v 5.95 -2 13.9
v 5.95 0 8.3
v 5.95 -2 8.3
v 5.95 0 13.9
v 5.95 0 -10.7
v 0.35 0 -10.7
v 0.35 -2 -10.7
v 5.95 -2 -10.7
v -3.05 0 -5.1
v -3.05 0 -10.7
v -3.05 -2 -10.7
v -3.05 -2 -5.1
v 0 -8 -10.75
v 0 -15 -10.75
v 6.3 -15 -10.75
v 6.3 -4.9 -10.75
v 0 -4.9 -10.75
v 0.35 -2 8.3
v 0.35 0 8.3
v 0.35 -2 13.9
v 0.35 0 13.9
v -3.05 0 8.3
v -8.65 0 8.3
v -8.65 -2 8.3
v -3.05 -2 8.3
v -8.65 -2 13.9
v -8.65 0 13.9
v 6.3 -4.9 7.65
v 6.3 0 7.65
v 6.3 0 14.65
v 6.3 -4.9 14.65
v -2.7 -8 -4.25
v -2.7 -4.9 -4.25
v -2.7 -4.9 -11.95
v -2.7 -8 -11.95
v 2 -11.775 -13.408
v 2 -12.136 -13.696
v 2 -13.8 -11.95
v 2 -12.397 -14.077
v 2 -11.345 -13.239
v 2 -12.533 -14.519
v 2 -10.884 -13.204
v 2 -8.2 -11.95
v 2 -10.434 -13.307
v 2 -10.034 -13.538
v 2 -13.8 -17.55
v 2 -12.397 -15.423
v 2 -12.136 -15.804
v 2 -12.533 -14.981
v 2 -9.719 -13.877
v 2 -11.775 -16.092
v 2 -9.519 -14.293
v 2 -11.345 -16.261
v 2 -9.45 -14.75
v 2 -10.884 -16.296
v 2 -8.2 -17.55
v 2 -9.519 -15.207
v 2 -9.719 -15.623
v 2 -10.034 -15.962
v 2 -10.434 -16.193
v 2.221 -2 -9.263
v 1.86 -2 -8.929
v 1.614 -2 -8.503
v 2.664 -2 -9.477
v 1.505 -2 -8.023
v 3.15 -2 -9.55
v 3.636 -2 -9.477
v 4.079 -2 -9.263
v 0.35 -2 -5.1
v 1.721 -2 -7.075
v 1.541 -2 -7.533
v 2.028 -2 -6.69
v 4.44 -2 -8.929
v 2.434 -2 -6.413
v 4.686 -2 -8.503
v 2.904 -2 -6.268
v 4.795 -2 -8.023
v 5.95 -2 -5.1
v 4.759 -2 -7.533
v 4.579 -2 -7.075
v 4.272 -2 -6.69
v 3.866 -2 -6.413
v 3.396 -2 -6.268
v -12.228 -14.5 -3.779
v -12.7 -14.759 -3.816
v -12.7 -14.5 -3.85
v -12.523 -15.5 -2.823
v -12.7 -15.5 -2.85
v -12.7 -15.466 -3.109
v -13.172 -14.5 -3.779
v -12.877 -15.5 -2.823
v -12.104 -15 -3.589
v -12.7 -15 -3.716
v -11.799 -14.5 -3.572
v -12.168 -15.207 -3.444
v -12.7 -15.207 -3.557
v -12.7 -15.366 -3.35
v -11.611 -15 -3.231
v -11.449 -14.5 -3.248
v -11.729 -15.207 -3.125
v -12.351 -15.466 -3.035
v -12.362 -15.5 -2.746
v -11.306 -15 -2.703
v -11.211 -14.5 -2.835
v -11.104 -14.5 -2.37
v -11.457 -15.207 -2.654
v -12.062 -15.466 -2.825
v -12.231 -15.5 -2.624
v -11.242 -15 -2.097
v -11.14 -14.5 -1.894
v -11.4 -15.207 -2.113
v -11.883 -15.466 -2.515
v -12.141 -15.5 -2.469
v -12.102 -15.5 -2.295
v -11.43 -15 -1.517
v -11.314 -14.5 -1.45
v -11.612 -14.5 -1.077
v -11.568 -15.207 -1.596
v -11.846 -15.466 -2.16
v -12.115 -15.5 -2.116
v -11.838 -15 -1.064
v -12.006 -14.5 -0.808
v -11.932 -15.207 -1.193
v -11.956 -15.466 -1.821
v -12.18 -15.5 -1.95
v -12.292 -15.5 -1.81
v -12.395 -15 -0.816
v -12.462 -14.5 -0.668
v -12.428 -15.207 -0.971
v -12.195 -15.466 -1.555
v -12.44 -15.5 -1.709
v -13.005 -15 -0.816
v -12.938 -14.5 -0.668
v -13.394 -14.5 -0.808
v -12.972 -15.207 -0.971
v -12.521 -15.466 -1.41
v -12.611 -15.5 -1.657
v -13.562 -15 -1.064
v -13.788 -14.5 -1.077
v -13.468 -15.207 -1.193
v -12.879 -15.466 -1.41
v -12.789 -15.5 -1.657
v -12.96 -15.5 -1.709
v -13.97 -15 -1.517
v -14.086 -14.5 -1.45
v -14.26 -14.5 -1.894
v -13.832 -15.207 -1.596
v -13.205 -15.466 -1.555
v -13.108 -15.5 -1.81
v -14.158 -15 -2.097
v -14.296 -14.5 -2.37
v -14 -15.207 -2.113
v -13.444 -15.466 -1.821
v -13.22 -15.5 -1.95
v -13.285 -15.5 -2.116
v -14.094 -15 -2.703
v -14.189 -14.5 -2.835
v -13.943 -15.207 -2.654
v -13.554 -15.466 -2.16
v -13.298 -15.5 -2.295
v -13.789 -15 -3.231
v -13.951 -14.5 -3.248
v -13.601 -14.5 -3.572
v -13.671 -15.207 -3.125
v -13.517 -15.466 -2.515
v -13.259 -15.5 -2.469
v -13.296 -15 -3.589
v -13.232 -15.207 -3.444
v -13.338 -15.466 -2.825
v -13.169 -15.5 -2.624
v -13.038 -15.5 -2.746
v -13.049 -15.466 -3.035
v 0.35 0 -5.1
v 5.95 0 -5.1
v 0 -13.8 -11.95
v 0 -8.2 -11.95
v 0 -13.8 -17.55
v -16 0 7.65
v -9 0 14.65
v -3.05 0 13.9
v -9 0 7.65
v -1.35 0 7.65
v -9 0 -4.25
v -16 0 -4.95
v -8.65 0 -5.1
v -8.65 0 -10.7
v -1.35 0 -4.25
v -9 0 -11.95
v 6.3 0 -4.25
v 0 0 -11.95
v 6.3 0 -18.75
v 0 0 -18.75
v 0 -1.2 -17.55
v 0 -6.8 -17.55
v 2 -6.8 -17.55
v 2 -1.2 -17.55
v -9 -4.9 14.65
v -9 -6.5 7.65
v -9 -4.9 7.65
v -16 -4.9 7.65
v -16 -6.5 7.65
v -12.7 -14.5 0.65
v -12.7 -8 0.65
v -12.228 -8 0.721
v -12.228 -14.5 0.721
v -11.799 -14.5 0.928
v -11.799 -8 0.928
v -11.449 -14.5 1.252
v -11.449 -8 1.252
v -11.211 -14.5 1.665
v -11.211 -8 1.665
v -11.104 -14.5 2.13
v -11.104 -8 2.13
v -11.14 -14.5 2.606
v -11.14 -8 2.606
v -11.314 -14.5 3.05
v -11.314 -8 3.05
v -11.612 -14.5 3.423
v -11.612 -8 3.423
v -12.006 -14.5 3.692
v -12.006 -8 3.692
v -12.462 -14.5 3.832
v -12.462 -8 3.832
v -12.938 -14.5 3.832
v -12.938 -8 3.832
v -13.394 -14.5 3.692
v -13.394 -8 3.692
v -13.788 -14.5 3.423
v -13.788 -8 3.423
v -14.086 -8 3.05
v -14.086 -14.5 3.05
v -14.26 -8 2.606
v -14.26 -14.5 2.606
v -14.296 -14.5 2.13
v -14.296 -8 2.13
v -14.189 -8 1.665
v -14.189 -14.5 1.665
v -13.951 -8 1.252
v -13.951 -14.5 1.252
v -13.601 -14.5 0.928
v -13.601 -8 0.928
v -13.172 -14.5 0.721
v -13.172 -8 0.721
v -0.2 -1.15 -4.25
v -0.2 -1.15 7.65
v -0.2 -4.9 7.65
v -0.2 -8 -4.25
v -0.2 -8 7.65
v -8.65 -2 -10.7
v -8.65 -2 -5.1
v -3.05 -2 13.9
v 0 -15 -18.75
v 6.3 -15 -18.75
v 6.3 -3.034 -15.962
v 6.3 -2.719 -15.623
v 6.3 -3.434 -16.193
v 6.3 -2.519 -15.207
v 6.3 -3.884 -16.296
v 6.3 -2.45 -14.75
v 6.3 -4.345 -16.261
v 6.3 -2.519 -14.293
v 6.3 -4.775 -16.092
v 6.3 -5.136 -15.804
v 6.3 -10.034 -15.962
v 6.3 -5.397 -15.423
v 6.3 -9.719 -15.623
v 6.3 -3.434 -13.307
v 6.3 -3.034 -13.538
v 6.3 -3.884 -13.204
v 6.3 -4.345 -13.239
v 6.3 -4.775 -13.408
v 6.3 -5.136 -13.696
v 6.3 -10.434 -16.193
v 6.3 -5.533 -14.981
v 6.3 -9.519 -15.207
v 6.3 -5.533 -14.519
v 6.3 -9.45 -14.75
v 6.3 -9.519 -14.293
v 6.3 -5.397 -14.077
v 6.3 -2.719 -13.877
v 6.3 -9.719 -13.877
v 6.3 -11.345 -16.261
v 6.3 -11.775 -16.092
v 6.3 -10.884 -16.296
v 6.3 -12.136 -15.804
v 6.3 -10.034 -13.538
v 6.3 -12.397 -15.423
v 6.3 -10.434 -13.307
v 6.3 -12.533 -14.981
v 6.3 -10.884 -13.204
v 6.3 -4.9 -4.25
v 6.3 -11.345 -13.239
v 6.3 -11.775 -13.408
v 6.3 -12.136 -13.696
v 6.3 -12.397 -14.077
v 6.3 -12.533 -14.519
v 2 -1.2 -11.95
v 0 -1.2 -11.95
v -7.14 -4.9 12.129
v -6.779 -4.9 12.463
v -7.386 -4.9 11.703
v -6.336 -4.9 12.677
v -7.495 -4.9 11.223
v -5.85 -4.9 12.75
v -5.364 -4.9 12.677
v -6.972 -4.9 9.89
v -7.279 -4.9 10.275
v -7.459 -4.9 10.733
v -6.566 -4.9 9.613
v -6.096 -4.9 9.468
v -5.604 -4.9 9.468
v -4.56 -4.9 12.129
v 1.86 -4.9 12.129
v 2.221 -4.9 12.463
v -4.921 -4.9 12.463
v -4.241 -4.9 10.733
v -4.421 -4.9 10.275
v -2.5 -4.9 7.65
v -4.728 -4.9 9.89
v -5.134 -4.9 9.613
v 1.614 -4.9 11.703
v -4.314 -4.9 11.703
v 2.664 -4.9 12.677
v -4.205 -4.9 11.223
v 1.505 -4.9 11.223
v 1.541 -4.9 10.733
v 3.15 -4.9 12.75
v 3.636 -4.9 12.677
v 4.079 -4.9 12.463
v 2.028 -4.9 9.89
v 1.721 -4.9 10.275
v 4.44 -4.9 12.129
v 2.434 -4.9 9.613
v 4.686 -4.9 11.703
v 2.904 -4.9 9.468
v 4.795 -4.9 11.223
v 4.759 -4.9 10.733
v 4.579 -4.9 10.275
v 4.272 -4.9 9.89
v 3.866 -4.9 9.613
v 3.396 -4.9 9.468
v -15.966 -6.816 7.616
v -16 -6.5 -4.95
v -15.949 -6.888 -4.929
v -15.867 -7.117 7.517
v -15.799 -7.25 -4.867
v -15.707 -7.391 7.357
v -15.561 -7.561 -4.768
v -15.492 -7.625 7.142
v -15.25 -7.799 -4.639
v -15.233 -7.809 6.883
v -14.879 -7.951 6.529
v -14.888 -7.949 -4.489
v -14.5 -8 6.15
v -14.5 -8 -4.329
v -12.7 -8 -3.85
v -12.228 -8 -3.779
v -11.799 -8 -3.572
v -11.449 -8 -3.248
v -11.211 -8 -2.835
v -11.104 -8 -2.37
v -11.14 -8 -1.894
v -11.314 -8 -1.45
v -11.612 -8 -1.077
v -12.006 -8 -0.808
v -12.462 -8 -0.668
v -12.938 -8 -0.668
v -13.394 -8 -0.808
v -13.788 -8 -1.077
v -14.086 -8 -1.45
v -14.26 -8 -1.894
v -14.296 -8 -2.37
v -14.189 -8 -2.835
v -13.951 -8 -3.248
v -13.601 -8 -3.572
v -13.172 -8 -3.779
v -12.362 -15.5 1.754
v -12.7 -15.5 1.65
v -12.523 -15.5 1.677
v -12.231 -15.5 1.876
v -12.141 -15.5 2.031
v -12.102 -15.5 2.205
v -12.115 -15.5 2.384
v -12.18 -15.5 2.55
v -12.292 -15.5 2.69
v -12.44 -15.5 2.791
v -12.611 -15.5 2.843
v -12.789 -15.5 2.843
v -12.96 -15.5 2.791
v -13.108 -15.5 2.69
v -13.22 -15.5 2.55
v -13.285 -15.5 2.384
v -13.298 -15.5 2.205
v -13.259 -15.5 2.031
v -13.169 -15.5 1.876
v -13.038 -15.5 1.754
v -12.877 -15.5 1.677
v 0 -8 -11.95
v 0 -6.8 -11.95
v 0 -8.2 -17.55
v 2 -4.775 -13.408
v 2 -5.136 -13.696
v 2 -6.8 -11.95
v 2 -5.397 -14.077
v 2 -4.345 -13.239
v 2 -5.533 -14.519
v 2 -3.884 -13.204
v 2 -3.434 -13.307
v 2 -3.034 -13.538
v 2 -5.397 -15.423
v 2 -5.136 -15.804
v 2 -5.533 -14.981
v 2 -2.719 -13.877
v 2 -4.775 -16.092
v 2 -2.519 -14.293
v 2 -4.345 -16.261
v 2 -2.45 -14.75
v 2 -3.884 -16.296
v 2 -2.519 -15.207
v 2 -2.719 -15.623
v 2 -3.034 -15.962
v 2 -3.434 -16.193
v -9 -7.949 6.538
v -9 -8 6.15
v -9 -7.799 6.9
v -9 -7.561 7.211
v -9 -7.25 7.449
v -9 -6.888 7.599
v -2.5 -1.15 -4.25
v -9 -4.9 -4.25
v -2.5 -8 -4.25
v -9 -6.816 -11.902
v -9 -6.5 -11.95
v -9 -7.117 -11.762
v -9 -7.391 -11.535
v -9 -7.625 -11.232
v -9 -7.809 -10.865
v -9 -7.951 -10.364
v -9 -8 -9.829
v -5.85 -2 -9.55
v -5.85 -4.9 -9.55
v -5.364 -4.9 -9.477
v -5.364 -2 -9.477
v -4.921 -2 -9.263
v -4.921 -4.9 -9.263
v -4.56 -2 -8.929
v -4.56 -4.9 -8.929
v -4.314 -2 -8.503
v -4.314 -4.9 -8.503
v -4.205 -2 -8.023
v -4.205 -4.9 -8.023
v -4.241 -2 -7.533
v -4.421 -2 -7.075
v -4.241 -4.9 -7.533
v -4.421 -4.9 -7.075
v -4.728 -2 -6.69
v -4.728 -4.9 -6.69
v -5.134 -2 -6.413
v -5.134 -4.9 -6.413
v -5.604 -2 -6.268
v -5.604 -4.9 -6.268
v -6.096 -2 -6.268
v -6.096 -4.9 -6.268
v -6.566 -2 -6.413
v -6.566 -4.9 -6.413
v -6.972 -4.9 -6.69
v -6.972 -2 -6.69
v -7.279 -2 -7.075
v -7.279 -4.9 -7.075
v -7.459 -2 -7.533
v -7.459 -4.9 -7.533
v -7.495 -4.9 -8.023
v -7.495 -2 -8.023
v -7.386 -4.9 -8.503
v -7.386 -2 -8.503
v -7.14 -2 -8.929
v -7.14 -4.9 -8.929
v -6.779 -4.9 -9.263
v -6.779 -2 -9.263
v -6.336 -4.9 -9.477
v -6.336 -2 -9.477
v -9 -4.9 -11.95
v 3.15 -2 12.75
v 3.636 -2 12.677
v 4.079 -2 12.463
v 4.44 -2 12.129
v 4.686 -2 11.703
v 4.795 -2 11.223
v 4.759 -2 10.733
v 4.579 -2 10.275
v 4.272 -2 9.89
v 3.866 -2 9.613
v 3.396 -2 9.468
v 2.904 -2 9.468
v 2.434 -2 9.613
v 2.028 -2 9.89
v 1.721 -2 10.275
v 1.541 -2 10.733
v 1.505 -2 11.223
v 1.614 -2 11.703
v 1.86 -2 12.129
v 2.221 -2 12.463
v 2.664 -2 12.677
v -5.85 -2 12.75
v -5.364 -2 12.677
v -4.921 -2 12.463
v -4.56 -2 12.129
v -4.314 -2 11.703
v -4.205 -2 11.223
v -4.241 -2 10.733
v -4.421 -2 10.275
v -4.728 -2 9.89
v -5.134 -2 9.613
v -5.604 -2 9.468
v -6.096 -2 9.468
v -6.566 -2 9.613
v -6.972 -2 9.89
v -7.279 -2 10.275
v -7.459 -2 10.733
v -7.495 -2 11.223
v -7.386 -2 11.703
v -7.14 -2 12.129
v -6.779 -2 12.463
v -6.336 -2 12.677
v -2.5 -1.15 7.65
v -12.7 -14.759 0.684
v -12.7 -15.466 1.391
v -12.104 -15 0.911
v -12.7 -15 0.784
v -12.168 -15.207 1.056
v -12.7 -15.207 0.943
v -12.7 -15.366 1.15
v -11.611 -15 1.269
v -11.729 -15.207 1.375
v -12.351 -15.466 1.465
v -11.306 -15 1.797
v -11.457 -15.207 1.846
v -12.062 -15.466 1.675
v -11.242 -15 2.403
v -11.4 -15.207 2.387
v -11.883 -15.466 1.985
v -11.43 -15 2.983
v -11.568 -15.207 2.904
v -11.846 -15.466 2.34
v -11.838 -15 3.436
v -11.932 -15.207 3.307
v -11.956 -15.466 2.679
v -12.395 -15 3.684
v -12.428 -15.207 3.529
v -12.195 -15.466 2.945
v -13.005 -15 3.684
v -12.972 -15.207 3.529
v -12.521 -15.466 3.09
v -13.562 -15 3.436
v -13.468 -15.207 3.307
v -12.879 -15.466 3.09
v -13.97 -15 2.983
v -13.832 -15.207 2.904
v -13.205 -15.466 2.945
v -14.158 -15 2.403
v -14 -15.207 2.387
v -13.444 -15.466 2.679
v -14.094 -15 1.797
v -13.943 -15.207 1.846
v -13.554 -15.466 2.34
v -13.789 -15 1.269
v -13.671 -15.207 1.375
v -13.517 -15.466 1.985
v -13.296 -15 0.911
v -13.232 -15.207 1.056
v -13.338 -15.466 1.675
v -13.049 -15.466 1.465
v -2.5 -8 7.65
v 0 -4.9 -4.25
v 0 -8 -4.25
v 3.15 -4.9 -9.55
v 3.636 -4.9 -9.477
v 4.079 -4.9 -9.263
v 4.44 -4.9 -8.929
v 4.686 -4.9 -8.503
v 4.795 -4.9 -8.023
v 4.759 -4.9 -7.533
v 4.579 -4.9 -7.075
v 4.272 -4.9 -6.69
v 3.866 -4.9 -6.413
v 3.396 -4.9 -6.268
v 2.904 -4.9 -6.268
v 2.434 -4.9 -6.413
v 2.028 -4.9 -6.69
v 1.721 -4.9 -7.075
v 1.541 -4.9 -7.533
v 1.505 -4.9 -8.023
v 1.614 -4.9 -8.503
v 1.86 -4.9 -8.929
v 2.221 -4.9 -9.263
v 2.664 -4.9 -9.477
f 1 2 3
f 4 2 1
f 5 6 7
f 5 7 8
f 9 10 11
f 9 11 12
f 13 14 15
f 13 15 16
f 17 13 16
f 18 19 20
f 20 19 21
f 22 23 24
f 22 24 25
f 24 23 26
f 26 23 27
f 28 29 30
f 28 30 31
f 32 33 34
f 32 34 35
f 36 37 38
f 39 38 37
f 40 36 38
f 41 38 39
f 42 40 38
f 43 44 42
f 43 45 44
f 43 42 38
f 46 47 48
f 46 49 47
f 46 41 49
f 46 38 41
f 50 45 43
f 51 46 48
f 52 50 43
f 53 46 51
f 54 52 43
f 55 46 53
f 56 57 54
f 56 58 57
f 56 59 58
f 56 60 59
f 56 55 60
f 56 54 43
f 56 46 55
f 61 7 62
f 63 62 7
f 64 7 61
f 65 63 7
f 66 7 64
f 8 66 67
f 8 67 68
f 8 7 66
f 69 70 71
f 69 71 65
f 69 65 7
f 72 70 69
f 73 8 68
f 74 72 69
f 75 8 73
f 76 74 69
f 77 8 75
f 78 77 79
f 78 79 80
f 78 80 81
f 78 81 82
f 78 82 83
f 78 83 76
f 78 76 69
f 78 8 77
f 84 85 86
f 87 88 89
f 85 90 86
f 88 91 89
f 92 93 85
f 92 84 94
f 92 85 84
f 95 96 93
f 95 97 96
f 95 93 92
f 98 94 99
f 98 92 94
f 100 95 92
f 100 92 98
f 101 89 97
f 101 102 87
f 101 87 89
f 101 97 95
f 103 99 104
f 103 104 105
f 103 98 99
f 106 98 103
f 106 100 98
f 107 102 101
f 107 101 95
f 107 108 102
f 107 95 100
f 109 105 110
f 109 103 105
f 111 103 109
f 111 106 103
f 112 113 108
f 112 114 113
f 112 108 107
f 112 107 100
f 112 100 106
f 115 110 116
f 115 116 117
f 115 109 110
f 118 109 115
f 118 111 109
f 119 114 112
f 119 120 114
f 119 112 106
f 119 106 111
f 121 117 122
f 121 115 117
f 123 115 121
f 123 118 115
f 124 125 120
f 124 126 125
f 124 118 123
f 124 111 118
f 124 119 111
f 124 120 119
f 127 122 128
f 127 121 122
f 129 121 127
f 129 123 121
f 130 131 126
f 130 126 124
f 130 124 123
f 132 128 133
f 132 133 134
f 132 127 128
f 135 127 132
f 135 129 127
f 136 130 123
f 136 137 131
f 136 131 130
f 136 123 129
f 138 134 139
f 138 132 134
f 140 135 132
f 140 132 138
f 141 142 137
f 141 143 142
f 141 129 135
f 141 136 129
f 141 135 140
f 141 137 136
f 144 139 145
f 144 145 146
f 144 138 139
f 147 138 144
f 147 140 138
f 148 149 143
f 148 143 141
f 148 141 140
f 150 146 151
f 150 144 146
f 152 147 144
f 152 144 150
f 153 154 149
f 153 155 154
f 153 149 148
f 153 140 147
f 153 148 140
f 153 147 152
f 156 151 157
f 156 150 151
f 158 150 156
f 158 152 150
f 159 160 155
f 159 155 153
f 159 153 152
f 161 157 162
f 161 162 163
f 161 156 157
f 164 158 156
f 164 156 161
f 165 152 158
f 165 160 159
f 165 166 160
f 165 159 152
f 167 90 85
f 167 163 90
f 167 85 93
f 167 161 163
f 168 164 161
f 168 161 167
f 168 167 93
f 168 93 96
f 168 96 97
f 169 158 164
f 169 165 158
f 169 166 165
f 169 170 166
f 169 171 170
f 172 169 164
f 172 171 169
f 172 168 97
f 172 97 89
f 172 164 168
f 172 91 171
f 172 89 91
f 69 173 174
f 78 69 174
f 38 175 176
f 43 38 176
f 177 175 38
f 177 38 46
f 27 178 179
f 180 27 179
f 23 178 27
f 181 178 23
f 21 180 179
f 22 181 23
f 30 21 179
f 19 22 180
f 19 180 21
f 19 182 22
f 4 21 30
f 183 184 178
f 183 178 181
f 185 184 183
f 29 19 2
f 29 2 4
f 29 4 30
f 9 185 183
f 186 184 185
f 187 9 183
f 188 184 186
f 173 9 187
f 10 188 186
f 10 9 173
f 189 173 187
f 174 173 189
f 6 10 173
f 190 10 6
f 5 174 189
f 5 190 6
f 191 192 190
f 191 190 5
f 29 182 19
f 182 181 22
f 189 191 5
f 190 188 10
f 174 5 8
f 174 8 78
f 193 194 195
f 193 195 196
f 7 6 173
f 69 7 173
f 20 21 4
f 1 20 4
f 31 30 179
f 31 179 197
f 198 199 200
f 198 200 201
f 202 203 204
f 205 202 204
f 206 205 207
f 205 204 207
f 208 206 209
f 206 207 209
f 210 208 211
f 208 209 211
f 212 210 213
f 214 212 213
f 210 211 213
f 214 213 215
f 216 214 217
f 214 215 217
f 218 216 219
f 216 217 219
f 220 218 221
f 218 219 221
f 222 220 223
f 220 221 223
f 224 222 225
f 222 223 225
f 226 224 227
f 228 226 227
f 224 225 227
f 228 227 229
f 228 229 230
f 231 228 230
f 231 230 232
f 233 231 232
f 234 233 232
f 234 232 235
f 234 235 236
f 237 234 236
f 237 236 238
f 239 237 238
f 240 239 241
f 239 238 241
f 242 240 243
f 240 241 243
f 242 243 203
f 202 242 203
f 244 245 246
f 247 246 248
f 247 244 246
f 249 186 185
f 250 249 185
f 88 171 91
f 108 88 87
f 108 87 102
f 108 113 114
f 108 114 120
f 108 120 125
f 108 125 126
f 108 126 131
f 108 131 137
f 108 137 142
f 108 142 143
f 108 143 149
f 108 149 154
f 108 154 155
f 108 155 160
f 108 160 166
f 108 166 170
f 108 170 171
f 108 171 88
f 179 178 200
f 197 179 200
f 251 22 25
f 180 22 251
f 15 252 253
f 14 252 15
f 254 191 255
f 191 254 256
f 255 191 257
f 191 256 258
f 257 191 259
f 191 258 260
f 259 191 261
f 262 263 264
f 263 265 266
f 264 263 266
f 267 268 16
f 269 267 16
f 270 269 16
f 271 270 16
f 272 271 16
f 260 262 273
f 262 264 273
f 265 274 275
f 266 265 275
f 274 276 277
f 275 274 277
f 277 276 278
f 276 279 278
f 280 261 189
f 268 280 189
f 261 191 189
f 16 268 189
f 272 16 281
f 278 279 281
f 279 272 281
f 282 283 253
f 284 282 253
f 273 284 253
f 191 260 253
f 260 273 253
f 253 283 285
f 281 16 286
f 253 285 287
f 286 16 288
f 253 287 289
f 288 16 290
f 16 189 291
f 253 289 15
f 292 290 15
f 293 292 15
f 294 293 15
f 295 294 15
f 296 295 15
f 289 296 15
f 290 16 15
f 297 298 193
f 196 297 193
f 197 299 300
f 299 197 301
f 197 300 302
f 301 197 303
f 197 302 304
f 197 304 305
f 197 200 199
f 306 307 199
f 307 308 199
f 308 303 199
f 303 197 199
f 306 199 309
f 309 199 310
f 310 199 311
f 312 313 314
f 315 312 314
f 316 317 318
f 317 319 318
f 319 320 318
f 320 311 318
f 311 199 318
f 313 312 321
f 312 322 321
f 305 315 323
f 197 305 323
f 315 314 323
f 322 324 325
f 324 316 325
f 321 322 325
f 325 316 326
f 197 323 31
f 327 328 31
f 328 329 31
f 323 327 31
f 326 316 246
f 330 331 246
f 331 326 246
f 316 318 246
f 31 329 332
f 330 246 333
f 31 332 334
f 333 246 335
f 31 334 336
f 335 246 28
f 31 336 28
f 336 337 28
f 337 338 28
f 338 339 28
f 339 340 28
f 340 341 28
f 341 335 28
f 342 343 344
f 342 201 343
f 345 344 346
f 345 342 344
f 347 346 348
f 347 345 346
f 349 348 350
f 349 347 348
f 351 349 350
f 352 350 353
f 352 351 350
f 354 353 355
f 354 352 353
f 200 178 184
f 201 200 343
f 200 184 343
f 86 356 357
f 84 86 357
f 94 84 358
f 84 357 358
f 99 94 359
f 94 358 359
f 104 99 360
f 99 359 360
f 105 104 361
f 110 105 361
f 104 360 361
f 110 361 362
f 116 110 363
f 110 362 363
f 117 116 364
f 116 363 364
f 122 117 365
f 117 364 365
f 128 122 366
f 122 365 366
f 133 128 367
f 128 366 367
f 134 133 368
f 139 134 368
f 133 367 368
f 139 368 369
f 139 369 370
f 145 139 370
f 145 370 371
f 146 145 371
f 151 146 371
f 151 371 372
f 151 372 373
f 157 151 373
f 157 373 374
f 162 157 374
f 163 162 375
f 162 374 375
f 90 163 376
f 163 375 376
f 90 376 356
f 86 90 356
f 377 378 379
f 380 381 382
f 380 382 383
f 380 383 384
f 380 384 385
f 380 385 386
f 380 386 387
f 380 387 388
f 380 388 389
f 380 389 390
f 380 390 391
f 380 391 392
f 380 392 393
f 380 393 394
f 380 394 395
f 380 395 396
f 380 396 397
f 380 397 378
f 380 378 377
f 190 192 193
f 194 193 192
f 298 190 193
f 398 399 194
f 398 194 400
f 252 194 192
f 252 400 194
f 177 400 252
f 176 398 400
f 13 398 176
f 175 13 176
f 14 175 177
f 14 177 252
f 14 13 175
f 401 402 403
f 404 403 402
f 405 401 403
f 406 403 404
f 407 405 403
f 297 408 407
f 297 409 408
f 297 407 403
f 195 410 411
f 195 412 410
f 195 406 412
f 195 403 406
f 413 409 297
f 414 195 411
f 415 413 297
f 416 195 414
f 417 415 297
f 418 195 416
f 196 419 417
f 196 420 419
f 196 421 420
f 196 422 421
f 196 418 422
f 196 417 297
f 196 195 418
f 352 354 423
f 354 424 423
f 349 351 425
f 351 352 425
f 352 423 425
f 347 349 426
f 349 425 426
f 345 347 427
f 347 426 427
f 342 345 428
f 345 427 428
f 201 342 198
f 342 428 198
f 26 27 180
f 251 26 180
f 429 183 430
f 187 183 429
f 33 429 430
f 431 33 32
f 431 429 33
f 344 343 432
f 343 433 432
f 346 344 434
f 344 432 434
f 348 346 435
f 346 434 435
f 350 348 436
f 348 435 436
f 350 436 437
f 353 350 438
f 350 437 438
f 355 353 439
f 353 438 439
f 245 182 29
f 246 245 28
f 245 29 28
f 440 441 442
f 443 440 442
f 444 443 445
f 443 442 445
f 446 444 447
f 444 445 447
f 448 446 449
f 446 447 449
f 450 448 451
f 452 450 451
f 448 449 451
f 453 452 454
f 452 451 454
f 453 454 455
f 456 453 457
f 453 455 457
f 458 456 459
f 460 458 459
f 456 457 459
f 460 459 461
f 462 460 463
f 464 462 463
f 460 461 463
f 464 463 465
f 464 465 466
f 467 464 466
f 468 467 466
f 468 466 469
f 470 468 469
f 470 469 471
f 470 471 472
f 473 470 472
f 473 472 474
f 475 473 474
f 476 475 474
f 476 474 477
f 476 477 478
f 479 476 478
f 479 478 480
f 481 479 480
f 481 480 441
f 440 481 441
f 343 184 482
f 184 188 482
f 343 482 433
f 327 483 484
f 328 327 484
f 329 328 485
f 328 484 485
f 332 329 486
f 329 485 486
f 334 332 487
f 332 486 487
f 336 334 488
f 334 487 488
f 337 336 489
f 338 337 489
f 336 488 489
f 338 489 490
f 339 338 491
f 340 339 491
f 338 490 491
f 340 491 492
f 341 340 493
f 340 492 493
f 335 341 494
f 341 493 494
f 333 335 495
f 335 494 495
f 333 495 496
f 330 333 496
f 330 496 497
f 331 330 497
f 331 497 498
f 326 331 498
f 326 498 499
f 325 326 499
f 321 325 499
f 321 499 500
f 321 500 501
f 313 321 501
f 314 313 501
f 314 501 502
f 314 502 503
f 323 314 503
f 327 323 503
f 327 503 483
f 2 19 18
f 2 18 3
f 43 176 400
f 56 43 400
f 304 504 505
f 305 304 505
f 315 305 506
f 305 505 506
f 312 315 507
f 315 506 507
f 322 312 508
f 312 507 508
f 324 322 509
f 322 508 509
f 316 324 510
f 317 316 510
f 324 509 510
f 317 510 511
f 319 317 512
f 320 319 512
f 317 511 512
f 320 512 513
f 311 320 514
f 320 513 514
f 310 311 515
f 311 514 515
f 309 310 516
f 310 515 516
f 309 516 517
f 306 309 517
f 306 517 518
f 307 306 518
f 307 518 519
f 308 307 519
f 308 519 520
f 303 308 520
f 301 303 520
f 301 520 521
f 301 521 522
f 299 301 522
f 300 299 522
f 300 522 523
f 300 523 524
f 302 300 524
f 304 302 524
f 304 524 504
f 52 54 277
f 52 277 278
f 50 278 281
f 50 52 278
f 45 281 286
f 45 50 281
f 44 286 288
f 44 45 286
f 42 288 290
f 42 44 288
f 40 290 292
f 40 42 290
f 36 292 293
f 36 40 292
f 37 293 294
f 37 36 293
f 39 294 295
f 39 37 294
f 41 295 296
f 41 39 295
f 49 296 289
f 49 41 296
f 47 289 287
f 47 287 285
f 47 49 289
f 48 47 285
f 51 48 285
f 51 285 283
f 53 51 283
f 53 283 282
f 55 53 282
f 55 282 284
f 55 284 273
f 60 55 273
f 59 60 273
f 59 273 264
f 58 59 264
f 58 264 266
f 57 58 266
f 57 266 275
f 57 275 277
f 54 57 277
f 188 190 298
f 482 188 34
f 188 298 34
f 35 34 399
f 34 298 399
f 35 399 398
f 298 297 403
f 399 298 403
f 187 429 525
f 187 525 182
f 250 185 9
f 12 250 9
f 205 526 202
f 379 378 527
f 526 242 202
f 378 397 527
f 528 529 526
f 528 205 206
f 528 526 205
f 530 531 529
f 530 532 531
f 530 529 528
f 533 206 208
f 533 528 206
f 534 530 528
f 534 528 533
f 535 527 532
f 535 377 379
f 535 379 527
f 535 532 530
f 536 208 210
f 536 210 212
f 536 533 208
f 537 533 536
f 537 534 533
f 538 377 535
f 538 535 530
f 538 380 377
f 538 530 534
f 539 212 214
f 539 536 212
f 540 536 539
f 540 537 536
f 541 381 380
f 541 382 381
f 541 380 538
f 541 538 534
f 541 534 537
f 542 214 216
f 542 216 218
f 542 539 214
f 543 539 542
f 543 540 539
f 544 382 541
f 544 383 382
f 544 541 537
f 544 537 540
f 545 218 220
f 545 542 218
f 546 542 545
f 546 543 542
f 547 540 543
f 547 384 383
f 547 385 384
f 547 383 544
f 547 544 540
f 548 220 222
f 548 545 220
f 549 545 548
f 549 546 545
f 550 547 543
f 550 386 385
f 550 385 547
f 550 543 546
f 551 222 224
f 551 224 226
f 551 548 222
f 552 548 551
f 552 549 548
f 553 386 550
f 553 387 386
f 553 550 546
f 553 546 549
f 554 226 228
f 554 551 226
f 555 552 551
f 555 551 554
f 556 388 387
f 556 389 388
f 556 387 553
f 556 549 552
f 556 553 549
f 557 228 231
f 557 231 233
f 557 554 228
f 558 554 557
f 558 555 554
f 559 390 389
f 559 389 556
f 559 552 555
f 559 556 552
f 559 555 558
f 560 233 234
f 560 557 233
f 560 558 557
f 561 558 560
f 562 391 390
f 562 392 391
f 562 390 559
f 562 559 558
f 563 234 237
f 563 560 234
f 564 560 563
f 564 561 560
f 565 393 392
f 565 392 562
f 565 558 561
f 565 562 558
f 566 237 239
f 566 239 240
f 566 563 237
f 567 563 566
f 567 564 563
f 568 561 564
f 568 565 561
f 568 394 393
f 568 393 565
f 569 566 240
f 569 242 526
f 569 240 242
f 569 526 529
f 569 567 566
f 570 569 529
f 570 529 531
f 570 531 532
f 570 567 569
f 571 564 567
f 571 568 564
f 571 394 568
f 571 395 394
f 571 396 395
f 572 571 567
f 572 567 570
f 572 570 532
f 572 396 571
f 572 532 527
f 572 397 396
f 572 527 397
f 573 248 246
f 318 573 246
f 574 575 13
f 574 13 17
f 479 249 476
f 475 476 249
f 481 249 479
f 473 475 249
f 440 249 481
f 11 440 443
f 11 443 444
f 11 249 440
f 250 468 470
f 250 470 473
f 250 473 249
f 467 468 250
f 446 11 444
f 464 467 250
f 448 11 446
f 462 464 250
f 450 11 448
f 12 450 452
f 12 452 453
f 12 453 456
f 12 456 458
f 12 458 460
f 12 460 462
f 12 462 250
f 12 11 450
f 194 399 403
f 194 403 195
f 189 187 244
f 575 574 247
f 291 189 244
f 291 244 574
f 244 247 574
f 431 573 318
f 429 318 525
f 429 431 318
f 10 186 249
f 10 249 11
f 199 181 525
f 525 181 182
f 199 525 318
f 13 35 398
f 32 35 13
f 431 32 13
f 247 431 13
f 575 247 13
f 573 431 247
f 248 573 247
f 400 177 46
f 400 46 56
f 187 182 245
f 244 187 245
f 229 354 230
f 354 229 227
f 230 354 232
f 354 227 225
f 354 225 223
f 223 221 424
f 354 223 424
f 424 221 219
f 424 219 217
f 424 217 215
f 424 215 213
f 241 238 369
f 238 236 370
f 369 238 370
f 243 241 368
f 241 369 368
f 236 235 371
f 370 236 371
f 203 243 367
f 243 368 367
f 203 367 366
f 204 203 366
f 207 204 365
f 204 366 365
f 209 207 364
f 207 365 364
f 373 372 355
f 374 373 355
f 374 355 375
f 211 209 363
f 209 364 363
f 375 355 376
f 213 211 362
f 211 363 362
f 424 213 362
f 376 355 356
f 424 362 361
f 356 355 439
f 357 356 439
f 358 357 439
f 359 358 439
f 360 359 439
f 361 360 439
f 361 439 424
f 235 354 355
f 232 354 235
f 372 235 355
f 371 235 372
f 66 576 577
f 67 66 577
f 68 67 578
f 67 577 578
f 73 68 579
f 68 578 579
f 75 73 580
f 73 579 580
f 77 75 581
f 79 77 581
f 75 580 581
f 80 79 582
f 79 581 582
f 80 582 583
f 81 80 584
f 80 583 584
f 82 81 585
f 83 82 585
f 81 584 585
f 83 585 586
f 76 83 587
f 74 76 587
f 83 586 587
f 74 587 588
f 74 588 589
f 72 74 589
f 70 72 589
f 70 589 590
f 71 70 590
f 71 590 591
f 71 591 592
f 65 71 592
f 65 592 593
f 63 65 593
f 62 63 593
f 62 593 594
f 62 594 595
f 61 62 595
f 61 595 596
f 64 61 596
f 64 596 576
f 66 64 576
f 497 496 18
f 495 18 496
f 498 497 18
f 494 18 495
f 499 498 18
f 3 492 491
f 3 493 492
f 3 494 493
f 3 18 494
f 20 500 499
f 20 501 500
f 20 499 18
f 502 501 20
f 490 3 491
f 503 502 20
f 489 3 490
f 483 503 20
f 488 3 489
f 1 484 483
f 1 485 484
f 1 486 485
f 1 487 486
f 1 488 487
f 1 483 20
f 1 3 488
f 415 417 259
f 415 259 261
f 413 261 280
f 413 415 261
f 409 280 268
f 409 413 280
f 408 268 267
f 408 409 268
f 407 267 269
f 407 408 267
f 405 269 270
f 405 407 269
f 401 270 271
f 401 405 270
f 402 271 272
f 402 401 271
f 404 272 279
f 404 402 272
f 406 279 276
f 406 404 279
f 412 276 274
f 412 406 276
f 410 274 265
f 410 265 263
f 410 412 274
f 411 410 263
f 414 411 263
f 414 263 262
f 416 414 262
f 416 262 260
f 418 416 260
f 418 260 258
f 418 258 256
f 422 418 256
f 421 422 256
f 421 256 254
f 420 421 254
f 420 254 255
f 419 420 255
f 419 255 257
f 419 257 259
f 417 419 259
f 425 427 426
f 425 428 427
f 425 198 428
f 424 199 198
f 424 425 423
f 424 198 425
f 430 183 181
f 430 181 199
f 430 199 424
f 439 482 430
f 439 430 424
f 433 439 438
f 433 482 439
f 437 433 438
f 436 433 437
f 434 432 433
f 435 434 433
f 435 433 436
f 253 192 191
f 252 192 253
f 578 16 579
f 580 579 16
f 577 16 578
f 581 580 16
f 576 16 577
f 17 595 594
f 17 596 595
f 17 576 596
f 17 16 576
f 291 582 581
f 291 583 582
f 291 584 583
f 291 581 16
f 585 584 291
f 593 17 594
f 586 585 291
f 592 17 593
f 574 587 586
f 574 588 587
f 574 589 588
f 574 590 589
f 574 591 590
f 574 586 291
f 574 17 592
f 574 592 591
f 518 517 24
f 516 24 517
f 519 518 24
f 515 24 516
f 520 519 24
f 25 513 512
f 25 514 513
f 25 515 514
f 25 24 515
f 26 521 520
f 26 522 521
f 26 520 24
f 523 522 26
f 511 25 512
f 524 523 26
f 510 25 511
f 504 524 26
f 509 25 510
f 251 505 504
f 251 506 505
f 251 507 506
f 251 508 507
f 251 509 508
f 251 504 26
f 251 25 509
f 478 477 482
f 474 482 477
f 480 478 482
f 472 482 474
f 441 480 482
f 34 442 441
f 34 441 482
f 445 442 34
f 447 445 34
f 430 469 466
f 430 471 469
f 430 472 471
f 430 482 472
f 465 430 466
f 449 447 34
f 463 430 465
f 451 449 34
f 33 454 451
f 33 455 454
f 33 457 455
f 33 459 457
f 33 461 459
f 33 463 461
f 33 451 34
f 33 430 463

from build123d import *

# Parameters (mm, degrees)
SKETCH_R        = 1.55
PAD_DEPTH       = 6.3
SKETCH002_W     = 5.6
SKETCH002_H     = 5.6
POCKET_DEPTH    = 2
PAD001_DEPTH    = 7.7
SKETCH003_R     = 1.65
POCKET001_DEPTH = 4.901
SKETCH004_W     = 5.6
SKETCH004_H     = 5.6
POCKET002_DEPTH = 2
SKETCH005_W     = 8
SKETCH005_H     = 7
PAD002_DEPTH    = 11.9
SKETCH006_R     = 1.6
PAD003_DEPTH    = 7.5
PAD004_DEPTH    = 11.9
SKETCH008_W     = 4.9
SKETCH008_H     = 22.3
PAD005_DEPTH    = 7
SKETCH009_R     = 1.65
POCKET003_DEPTH = 15.501
SKETCH010_W     = 5.6
SKETCH010_H     = 5.6
POCKET004_DEPTH = 2
CHAMFER_SIZE    = 7
FILLET_R        = 1.5
FILLET001_R     = 1


with BuildPart() as part:
    # Sketch → Pad (new body)
    with BuildSketch(Plane.YZ):
        Polygon((-4.9, -4.25), (0, -4.25), (0, -18.75), (-15, -18.75), (-15, -10.75), (-4.9, -10.75), align=None)
        with Locations((-11, -14.75)):
            Circle(SKETCH_R, mode=Mode.SUBTRACT)
        with Locations((-4, -14.75)):
            Circle(SKETCH_R, mode=Mode.SUBTRACT)
    extrude(amount=PAD_DEPTH)

    # Sketch002 (on Face9 of Pad) → Pocket (cut)
    with BuildSketch(Plane(origin=(0, 0, 0), x_dir=(0, 1, 0), z_dir=(-1, 0, 0))):
        with Locations((-4, 14.75)):
            Rectangle(SKETCH002_W, SKETCH002_H)
        with Locations((-11, 14.75)):
            Rectangle(SKETCH002_W, SKETCH002_H)
    extrude(amount=-POCKET_DEPTH, mode=Mode.SUBTRACT)

    # Sketch001 (on Face1 of Pad) → Pad001 (join)
    with BuildSketch(Plane(origin=(0, 0, -4.25), x_dir=(0, -1, 0), z_dir=(0, 0, 1))):
        Polygon((0, 0), (0, -16), (8, -16), (8, -9), (4.9, -9), (4.9, -2.7), (8, -2.7), (8, 0), align=None)
    extrude(amount=-PAD001_DEPTH)

    # Sketch003 (on Face1 of Pad001) → Pocket001 (cut, through all)
    with BuildSketch(Plane(origin=(0, -4.9, 0), x_dir=(0, 0, -1), z_dir=(0, -1, 0))):
        with Locations((7.9, -5.85)):
            Circle(SKETCH003_R)
        with Locations((7.9, 3.15)):
            Circle(SKETCH003_R)
    extrude(amount=-POCKET001_DEPTH, mode=Mode.SUBTRACT)

    # Sketch004 (on Face10 of Pocket001) → Pocket002 (cut)
    with BuildSketch(Plane.ZX):
        with Locations((-7.9, 3.15)):
            Rectangle(SKETCH004_W, SKETCH004_H)
        with Locations((-7.9, -5.85)):
            Rectangle(SKETCH004_W, SKETCH004_H)
    extrude(amount=-POCKET002_DEPTH, mode=Mode.SUBTRACT)

    # Sketch005 (on Face5 of Pocket002) → Pad002 (join)
    with BuildSketch(Plane(origin=(0, 0, -4.25), x_dir=(0, -1, 0), z_dir=(0, 0, 1))):
        with Locations((4, -12.5)):
            Rectangle(SKETCH005_W, SKETCH005_H)
    extrude(amount=PAD002_DEPTH)

    # Sketch006 (on Face36 of Pad002) → Pad003 (join)
    with BuildSketch(Plane(origin=(0, -8, 0), x_dir=(0, 0, -1), z_dir=(0, -1, 0))):
        with Locations((-2.25, -12.7)):
            Circle(SKETCH006_R)
        with Locations((2.25, -12.7)):
            Circle(SKETCH006_R)
    extrude(amount=PAD003_DEPTH)

    # Sketch007 (on Face7 of Pad003) → Pad004 (join)
    with BuildSketch(Plane(origin=(0, 0, -4.25), x_dir=(0, -1, 0), z_dir=(0, 0, 1))):
        Polygon((8, -2.5), (1.15, -2.5), (0, -1.35), (1.15, -0.2), (8, -0.2), align=None)
    extrude(amount=PAD004_DEPTH)

    # Sketch008 (on Face14 of Pad004) → Pad005 (join)
    with BuildSketch(Plane(origin=(0, 0, 7.65), x_dir=(0, -1, 0), z_dir=(0, 0, 1))):
        with Locations((2.45, -4.85)):
            Rectangle(SKETCH008_W, SKETCH008_H)
    extrude(amount=PAD005_DEPTH)

    # Sketch009 (on Face54 of Pad005) → Pocket003 (cut, through all)
    with BuildSketch(Plane.ZX):
        with Locations((11.1, 3.15)):
            Circle(SKETCH009_R)
        with Locations((11.1, -5.85)):
            Circle(SKETCH009_R)
    extrude(amount=-POCKET003_DEPTH, mode=Mode.SUBTRACT)

    # Sketch010 (on Face4 of Pocket003) → Pocket004 (cut)
    with BuildSketch(Plane.ZX):
        with Locations((11.1, 3.15)):
            Rectangle(SKETCH010_W, SKETCH010_H)
        with Locations((11.1, -5.85)):
            Rectangle(SKETCH010_W, SKETCH010_H)
    extrude(amount=-POCKET004_DEPTH, mode=Mode.SUBTRACT)

    # Chamfer
    chamfer_edges = [part.edges().sort_by_distance(p)[0] for p in [
        (-16, -2.45, 14.65),
        (-16, -4, -11.95),
    ]]
    chamfer(chamfer_edges, length=CHAMFER_SIZE)

    # Fillet
    fillet_edges = [part.edges().sort_by_distance(p)[0] for p in [
        (-12.5, -8, -8.45),
        (-16, -8, 1.35),
        (-12.5, -8, 7.65),
    ]]
    fillet(fillet_edges, radius=FILLET_R)

    # Fillet001
    fillet001_edges = [part.edges().sort_by_distance(p)[0] for p in [
        (-12.7, -15.5, -0.65),
        (-12.7, -15.5, 3.85),
    ]]
    fillet(fillet001_edges, radius=FILLET001_R)


solid = part.part
